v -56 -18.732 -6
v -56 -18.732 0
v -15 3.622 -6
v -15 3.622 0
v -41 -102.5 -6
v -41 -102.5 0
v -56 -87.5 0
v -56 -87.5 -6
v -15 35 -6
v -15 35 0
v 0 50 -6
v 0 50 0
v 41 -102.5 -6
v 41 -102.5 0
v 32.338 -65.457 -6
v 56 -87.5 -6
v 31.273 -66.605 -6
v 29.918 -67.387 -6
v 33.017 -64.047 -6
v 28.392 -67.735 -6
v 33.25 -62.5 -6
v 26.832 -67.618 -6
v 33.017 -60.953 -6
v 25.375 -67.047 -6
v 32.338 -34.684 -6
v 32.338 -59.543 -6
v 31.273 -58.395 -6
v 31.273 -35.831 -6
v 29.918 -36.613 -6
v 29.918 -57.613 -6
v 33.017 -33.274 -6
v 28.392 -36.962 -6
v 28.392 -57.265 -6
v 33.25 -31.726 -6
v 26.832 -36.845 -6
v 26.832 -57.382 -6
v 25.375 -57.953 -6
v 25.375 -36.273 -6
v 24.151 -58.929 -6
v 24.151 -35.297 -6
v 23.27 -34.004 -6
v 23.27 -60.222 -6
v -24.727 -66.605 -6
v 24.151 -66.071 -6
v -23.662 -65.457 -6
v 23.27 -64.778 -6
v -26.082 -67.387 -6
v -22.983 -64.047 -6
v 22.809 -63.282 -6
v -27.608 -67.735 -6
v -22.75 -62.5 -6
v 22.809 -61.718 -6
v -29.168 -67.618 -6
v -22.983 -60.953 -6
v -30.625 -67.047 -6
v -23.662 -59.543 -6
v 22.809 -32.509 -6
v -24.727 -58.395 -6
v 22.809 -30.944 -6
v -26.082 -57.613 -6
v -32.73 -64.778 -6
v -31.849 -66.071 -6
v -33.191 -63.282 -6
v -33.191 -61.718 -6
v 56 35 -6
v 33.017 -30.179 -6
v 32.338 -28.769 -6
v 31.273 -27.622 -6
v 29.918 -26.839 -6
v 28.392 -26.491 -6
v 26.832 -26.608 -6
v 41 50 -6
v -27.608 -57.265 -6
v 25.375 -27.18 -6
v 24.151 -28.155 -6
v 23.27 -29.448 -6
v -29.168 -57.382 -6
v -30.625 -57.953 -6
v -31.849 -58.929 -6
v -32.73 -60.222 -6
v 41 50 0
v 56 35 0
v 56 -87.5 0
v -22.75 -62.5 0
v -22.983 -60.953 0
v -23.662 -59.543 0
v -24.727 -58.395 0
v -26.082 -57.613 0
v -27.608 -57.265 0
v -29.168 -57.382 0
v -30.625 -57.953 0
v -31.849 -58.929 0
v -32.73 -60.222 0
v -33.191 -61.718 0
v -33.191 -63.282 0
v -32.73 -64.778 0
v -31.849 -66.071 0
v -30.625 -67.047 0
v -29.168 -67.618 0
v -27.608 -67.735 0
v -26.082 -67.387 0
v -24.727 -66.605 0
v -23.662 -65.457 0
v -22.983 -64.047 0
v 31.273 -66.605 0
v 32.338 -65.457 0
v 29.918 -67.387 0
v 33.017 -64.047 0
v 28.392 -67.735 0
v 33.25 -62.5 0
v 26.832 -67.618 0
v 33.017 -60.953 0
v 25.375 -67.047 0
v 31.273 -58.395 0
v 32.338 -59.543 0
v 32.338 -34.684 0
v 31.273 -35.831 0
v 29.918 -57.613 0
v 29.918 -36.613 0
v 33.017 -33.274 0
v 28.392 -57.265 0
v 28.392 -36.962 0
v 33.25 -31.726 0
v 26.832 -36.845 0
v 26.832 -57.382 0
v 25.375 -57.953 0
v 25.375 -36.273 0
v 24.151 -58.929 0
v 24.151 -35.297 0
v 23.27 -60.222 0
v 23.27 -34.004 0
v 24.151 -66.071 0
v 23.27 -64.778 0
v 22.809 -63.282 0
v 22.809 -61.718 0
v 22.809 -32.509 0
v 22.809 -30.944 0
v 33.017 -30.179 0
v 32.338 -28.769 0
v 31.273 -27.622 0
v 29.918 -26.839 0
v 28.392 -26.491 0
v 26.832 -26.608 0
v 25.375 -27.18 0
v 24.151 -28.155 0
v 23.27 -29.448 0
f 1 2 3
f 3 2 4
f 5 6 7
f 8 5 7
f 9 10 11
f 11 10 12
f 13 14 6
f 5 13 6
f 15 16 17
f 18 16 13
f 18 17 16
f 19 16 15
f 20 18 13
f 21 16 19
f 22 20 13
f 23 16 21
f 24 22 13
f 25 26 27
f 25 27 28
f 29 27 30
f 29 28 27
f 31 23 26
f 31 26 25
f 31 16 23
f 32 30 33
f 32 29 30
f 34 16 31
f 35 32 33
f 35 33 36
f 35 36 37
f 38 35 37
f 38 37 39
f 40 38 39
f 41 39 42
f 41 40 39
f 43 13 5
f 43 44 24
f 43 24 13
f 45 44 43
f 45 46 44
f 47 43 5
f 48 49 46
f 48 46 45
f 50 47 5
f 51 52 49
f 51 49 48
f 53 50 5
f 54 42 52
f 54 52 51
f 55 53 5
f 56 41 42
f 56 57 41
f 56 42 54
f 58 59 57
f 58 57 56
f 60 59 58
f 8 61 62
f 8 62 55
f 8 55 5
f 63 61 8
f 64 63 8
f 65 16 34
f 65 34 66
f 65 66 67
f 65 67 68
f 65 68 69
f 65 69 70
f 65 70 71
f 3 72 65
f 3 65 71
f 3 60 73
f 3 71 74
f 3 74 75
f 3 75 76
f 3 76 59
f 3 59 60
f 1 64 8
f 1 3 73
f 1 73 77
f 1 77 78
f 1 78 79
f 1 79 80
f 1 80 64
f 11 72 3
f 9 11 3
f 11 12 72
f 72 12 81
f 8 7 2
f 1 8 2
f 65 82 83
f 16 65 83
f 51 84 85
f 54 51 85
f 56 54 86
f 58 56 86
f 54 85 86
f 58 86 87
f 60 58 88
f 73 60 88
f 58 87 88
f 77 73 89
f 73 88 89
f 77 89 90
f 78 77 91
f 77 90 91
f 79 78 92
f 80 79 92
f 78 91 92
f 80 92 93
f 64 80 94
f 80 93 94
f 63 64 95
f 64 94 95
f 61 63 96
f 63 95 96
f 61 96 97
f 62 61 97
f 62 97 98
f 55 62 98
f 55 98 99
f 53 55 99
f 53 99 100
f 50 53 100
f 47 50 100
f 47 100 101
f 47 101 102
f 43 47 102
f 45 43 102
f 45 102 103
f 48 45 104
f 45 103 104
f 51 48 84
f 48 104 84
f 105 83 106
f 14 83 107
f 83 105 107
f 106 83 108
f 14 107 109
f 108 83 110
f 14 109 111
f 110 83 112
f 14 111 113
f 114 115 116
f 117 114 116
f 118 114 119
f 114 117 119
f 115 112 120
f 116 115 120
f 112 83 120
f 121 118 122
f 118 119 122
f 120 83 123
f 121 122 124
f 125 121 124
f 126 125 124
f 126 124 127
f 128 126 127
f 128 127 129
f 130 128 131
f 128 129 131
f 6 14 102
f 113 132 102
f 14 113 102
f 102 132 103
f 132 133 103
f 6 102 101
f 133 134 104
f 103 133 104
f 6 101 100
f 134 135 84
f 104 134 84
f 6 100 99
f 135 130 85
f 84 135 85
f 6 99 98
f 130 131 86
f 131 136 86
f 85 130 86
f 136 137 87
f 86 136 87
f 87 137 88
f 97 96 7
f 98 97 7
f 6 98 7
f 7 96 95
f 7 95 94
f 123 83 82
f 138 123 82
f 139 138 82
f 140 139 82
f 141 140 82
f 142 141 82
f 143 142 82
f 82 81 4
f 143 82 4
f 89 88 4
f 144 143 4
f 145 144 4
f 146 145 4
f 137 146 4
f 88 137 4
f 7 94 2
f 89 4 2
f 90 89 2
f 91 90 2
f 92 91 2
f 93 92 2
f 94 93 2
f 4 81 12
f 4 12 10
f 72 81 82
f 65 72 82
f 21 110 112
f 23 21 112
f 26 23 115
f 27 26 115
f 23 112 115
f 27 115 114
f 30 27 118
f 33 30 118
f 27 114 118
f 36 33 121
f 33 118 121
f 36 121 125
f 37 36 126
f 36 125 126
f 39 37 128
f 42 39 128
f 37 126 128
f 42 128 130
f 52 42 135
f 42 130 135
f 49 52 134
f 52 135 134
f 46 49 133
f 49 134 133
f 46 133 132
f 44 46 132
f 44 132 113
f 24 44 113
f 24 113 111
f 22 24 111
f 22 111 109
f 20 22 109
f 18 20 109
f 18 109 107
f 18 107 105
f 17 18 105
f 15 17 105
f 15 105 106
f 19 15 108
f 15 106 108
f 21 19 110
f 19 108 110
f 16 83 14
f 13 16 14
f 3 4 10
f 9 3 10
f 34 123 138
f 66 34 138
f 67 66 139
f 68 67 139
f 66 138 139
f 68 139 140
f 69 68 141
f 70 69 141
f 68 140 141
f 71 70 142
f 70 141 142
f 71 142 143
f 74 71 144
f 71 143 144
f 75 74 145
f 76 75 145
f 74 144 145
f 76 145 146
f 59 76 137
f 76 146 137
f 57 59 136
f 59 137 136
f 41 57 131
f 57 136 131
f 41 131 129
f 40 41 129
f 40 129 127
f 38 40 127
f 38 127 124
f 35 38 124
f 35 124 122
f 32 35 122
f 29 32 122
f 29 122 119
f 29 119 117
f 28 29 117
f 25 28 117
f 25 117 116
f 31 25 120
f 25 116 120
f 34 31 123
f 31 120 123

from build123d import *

# Parameters (mm, degrees)
SKETCH_1_R             = 5.25
SM_BASE_FLANGE_1_DEPTH = 6


# Sheet-metal steps are written as plain solids
with BuildPart() as part:
    # Sketch 1 → Базовая кромка1 (new body)
    with BuildSketch(Plane.XY):
        Polygon((-41, -102.5), (-56, -87.5), (-56, -18.731551379), (-15, 3.62230522), (-15, 35), (0, 50), (41, 50), (56, 35), (56, -87.5), (41, -102.5), align=None)
        with Locations((-28, -62.5)):
            Circle(SKETCH_1_R, mode=Mode.SUBTRACT)
        with Locations((28, -62.5)):
            Circle(SKETCH_1_R, mode=Mode.SUBTRACT)
        with Locations((28, -31.72618932)):
            Circle(SKETCH_1_R, mode=Mode.SUBTRACT)
    extrude(amount=-SM_BASE_FLANGE_1_DEPTH)


solid = part.part
